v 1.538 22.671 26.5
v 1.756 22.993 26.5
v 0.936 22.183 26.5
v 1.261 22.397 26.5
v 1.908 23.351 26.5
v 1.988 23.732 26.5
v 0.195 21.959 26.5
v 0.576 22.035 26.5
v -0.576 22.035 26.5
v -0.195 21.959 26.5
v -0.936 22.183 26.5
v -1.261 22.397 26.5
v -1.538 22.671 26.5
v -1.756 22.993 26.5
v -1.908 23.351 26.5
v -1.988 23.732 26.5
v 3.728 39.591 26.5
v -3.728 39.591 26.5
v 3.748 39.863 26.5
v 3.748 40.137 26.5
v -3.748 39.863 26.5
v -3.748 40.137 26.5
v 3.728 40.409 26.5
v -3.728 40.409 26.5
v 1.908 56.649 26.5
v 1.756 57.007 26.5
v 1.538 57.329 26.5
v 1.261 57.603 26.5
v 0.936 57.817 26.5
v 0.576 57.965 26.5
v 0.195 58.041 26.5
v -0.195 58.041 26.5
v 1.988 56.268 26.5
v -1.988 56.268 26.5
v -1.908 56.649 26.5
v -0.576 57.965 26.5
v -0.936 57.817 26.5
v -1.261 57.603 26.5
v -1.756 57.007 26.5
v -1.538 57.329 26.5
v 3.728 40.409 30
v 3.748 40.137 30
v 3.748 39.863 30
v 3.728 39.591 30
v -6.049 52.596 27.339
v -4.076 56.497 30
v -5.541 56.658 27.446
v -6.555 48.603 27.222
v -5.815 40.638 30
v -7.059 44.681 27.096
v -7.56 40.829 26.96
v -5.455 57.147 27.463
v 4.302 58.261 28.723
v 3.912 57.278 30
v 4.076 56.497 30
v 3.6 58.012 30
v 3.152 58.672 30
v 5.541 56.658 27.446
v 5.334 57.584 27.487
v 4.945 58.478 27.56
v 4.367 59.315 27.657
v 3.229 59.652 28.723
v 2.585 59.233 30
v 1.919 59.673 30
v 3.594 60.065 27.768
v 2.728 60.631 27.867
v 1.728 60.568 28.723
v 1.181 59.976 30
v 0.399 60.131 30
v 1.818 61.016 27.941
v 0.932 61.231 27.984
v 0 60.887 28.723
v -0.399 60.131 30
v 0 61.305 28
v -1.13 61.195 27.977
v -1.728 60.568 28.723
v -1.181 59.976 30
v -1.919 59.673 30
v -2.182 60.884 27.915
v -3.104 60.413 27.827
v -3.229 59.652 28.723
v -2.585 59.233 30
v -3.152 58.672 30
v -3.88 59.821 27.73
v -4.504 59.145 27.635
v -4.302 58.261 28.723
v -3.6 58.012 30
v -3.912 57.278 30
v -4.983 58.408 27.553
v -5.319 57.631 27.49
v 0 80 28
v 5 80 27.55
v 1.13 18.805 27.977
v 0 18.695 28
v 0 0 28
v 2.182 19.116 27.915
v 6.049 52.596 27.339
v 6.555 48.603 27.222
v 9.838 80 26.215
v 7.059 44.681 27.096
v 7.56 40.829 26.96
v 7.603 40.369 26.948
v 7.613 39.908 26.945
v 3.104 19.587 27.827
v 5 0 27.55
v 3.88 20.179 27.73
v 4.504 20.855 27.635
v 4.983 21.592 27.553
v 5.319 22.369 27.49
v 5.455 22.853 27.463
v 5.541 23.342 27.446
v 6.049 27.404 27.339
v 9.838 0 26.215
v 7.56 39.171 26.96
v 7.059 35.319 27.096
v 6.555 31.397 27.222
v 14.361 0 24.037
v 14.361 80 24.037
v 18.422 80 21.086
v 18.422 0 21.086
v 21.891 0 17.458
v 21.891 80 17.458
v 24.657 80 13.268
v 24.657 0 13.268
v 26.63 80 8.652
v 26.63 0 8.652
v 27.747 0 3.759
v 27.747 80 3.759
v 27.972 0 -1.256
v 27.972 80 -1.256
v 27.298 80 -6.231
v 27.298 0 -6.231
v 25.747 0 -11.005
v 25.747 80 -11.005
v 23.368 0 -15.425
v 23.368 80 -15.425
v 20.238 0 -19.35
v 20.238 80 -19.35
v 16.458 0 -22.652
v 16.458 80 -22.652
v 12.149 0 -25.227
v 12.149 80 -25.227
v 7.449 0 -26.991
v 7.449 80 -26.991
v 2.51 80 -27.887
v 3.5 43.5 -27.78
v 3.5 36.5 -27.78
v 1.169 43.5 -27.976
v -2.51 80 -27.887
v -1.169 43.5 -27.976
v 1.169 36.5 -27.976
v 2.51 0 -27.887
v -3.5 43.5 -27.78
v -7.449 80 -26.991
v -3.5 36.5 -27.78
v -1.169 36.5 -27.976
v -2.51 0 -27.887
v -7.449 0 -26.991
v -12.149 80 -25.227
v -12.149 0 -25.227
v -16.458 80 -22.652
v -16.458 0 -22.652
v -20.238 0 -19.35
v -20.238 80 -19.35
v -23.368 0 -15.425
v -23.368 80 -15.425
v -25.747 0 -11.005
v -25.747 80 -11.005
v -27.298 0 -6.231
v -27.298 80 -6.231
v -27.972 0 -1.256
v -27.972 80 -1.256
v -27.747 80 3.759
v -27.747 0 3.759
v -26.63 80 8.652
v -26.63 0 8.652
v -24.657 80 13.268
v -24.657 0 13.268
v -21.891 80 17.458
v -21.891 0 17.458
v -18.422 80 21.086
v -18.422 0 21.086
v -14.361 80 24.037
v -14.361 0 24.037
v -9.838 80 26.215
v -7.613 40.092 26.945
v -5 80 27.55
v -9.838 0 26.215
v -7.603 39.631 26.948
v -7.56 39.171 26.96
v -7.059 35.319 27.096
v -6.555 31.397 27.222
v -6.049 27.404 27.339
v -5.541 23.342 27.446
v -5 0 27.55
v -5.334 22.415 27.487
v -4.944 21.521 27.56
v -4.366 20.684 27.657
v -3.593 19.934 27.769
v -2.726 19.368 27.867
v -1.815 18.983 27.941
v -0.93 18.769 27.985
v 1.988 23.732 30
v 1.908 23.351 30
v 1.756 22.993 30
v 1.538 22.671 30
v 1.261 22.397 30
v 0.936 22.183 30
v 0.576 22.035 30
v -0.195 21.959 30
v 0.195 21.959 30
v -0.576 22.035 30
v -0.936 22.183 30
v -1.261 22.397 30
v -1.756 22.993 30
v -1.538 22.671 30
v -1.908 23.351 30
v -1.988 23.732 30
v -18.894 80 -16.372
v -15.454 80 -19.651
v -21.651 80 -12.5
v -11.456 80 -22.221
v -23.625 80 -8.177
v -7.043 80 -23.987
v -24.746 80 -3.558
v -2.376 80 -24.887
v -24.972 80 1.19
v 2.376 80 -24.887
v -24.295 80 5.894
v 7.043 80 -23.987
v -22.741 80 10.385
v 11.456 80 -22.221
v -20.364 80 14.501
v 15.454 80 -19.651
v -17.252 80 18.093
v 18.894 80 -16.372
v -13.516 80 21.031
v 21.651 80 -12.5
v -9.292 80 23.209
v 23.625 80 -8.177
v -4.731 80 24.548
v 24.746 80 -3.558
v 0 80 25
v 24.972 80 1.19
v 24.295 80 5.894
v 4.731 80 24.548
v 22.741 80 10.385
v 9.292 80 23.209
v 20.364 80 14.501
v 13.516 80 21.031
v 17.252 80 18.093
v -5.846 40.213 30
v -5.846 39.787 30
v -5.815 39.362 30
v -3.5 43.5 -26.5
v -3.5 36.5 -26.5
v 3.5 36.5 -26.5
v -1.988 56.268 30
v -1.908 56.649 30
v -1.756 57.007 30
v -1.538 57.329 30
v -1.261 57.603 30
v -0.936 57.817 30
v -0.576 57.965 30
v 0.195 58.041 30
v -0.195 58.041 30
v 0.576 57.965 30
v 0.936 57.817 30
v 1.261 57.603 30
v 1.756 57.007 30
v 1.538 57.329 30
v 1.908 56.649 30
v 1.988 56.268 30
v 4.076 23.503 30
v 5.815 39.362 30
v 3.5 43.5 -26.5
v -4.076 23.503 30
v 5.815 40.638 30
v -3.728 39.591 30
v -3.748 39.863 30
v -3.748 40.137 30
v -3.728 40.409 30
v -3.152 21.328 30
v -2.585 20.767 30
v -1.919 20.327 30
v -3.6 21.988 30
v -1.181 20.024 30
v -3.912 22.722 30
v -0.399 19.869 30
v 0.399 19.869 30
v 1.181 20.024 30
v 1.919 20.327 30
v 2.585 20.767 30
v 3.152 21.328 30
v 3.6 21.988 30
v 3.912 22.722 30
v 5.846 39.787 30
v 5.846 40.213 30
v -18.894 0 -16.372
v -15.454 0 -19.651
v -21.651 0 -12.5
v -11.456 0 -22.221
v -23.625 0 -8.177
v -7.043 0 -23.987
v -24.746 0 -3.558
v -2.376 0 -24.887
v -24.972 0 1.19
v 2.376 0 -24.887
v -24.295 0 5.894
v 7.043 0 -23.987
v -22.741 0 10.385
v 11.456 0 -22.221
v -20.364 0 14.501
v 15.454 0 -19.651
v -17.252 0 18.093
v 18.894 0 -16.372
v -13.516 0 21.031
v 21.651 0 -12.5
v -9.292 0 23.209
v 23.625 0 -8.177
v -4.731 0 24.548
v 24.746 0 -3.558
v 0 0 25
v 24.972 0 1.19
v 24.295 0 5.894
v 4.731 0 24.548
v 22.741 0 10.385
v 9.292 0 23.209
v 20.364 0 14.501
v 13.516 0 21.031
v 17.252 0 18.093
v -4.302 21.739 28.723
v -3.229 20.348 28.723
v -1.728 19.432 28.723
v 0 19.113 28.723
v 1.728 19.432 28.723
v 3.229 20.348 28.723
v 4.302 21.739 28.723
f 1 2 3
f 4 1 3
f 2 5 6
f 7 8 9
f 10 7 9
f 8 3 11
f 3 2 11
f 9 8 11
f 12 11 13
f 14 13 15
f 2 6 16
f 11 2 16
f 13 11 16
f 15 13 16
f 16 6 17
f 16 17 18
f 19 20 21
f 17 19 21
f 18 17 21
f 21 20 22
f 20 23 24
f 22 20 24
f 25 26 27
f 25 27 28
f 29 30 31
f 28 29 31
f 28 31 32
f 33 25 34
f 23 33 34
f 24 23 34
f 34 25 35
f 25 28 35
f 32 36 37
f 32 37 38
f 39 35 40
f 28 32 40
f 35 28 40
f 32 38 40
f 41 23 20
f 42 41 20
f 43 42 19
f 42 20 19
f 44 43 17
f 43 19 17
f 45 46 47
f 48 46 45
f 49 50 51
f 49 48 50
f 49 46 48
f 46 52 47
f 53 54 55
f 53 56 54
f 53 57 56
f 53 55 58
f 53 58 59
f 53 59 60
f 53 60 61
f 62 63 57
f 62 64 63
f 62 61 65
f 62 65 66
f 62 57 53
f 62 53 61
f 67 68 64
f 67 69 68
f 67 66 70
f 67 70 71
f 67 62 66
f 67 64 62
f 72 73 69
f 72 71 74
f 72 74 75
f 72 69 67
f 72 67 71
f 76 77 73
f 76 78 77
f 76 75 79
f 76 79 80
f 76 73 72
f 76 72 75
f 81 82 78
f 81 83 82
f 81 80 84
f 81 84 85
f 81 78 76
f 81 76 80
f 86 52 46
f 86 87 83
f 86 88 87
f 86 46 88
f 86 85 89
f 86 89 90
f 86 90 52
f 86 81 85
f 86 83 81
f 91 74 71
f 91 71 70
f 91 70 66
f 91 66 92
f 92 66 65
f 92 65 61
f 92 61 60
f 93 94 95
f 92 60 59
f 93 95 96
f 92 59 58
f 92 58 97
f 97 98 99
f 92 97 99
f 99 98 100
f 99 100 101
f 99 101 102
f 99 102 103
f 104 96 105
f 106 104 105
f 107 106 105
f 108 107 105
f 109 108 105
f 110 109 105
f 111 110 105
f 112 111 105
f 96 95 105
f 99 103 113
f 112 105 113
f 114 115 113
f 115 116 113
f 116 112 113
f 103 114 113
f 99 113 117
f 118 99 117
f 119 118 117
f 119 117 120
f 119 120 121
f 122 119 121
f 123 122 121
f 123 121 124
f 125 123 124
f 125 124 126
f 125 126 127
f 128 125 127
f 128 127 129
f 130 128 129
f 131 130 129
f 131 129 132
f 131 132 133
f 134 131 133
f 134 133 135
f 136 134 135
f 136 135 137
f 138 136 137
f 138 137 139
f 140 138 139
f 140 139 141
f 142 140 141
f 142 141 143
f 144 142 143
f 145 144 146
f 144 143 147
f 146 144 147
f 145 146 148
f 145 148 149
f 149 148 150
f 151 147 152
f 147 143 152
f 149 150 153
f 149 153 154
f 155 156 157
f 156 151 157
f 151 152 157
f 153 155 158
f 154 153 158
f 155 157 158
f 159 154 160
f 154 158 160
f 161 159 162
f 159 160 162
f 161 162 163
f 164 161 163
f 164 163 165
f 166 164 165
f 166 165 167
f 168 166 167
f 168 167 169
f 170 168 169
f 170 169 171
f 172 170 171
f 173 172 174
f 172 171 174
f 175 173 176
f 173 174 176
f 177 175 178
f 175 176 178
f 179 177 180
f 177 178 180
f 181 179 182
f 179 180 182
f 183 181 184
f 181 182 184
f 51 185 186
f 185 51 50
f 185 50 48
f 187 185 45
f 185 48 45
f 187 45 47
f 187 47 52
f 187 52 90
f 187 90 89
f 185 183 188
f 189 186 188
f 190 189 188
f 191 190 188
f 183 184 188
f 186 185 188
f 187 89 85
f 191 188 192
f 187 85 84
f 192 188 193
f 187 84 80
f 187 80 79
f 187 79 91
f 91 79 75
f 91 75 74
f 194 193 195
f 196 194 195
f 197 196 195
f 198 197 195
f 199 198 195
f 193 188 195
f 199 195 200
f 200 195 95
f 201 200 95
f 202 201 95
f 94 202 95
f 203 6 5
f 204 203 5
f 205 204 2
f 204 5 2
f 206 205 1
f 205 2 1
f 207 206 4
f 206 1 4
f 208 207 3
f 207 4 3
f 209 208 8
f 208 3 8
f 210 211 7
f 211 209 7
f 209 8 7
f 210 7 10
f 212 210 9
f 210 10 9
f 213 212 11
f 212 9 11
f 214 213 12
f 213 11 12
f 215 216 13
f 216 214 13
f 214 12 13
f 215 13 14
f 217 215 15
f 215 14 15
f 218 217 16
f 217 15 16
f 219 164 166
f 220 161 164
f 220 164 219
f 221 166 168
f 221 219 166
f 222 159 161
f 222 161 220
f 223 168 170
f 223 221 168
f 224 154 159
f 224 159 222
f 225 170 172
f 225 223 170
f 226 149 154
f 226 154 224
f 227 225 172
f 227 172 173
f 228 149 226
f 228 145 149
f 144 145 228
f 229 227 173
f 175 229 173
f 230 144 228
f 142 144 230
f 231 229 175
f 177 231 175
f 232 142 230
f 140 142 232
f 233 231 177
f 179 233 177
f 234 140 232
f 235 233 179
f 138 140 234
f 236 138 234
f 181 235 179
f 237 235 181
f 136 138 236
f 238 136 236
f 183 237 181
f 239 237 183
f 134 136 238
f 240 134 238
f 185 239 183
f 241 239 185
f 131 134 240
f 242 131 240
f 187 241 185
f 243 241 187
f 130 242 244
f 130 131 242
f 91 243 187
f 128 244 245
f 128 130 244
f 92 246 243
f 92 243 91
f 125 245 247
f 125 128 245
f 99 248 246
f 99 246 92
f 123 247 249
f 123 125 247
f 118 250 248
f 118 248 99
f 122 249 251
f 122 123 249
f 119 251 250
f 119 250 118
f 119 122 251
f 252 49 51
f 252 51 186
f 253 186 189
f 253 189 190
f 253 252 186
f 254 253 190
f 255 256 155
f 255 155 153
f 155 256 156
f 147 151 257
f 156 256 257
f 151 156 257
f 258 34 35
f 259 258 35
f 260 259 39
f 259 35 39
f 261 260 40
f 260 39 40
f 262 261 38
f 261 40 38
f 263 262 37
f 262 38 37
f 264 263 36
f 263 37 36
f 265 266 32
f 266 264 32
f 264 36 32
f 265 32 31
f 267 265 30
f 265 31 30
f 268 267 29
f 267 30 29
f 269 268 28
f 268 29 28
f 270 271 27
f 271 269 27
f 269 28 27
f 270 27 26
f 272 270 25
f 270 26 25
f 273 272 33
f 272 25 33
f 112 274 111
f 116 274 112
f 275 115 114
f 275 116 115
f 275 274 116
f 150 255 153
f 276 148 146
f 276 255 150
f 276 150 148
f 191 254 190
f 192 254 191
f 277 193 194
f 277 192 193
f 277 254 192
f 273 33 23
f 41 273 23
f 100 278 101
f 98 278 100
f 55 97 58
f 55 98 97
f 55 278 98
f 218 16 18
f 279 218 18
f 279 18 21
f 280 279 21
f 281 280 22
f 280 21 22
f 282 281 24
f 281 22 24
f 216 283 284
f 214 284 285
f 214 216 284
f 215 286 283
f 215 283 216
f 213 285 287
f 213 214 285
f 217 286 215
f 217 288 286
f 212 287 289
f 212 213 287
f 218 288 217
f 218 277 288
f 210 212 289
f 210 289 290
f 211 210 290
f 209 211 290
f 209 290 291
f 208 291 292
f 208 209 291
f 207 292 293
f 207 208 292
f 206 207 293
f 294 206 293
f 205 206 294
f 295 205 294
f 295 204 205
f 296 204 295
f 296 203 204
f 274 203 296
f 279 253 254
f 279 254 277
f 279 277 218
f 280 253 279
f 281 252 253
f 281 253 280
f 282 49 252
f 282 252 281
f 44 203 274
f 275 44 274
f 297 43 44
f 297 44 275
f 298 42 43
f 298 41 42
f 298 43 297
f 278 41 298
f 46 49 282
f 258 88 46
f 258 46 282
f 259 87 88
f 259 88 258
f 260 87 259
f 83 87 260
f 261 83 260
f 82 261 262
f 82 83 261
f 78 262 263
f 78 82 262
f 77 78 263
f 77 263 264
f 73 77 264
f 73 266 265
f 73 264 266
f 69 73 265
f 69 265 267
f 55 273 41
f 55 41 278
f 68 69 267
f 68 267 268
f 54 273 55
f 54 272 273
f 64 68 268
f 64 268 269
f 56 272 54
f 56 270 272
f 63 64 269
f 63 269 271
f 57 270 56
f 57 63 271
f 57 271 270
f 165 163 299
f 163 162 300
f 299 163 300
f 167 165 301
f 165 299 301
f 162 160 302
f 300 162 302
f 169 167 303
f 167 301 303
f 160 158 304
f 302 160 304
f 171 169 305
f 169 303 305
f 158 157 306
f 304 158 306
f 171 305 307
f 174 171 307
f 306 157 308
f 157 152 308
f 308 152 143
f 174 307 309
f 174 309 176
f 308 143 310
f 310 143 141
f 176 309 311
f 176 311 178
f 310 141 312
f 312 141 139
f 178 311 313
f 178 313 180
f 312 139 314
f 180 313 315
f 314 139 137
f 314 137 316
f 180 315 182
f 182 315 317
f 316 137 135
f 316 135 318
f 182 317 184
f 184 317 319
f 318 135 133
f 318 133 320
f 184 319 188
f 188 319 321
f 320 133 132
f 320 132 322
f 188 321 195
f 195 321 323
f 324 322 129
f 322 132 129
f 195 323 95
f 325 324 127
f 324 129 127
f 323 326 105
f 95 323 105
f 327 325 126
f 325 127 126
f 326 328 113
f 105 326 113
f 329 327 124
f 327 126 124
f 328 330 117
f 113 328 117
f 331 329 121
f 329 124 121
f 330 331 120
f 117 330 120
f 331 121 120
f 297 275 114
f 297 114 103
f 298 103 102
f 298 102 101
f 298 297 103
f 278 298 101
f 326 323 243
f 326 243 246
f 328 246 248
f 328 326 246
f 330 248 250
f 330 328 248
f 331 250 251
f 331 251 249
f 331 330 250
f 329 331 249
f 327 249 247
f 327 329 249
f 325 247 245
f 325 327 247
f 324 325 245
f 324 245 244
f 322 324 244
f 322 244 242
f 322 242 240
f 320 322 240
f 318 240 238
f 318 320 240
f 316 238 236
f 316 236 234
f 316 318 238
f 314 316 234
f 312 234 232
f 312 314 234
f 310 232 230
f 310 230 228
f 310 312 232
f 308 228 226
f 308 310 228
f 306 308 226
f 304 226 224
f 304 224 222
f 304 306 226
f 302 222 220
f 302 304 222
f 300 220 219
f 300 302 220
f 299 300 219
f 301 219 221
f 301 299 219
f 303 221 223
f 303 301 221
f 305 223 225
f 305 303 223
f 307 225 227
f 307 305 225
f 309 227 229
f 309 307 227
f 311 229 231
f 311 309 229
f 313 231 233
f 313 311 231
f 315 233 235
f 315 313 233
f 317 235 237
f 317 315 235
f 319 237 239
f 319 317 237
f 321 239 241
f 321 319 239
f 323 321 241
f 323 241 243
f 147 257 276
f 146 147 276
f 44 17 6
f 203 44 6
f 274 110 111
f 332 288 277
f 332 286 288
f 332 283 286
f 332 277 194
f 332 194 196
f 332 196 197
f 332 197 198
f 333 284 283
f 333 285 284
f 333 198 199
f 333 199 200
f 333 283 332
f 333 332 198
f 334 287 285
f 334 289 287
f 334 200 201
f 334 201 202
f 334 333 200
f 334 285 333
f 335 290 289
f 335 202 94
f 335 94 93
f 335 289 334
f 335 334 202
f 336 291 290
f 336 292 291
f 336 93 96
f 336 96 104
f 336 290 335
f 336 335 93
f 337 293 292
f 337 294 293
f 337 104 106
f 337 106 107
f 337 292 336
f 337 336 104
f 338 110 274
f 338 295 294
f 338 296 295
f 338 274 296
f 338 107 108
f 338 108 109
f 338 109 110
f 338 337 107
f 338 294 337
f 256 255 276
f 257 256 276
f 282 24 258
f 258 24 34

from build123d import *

# Parameters (mm, degrees)
SKETCH1_R                = 28
SKETCH1_R_2              = 25
BOSS_EXTRUDE1_DEPTH      = 80
CUT_EXTRUDE3_DEPTH       = 101.768298586
EXTRUDE_THIN2_DEPTH      = 3.5
EXTRUDE_THIN3_REACH      = 104.703
EXTRUDE_THIN3_END_RADIUS = 28
EXTRUDE_THIN3_DRAFT      = 30
SKETCH10_W               = 7
SKETCH10_H               = 7
CUT_EXTRUDE4_DEPTH       = 3


with BuildPart() as part:
    # Sketch1 → Boss-Extrude1 (new body)
    with BuildSketch(Plane(origin=(0, 0, 0), x_dir=(1, 0, 0), z_dir=(0, 1, 0))):
        with Locations(Location((0, 0, 0), (0, 0, 270))):
            Circle(SKETCH1_R)
        with Locations(Location((0, 0, 0), (0, 0, 270))):
            Circle(SKETCH1_R_2, mode=Mode.SUBTRACT)
    extrude(amount=BOSS_EXTRUDE1_DEPTH)

    # Sketch6 → Cut-Extrude3 (cut, through all)
    with BuildSketch(Plane.XY.offset(26.5)):
        with BuildLine():
            Line((-3.727642468, 40.408878505), (-1.988075983, 56.268068536))
            ThreePointArc((-1.988075983, 56.268068536), (0, 58.05), (1.988075983, 56.268068536))
            Line((1.988075983, 56.268068536), (3.727642468, 40.408878505))
            ThreePointArc((3.727642468, 40.408878505), (3.75, 40), (3.727642468, 39.591121495))
            Line((3.727642468, 39.591121495), (1.988075983, 23.731931464))
            ThreePointArc((1.988075983, 23.731931464), (0, 21.95), (-1.988075983, 23.731931464))
            Line((-1.988075983, 23.731931464), (-3.727642468, 39.591121495))
            ThreePointArc((-3.727642468, 39.591121495), (-3.75, 40), (-3.727642468, 40.408878505))
        make_face()
    extrude(amount=CUT_EXTRUDE3_DEPTH, mode=Mode.SUBTRACT)

    # Sketch7 → Extrude-Thin2 (add)
    with BuildSketch(Plane.XY.offset(26.5)):
        with BuildLine():
            Line((5.715718451, 40.62694704), (3.976151966, 56.486137072))
            ThreePointArc((3.976151966, 56.486137072), (0, 60.05), (-3.976151966, 56.486137072))
            Line((-3.976151966, 56.486137072), (-5.715718451, 40.62694704))
            ThreePointArc((-5.715718451, 40.62694704), (-5.75, 40), (-5.715718451, 39.37305296))
            Line((-5.715718451, 39.37305296), (-3.976151966, 23.513862928))
            ThreePointArc((-3.976151966, 23.513862928), (0, 19.95), (3.976151966, 23.513862928))
            Line((3.976151966, 23.513862928), (5.715718451, 39.37305296))
            ThreePointArc((5.715718451, 39.37305296), (5.75, 40), (5.715718451, 40.62694704))
        make_face()
        with BuildLine():
            Line((3.727642468, 40.408878505), (1.988075983, 56.268068536))
            ThreePointArc((1.988075983, 56.268068536), (0, 58.05), (-1.988075983, 56.268068536))
            Line((-1.988075983, 56.268068536), (-3.727642468, 40.408878505))
            ThreePointArc((-3.727642468, 40.408878505), (-3.75, 40), (-3.727642468, 39.591121495))
            Line((-3.727642468, 39.591121495), (-1.988075983, 23.731931464))
            ThreePointArc((-1.988075983, 23.731931464), (0, 21.95), (1.988075983, 23.731931464))
            Line((1.988075983, 23.731931464), (3.727642468, 39.591121495))
            ThreePointArc((3.727642468, 39.591121495), (3.75, 40), (3.727642468, 40.408878505))
        make_face(mode=Mode.SUBTRACT)
    extrude(amount=EXTRUDE_THIN2_DEPTH)

    # Extrude-Thin3: up to this cylinder (the profile starts outside it)
    extrude_thin3_end = Plane(origin=(0, 48.56287, 0), z_dir=(0, -1, 0)) * Cylinder(EXTRUDE_THIN3_END_RADIUS, 266.406, mode=Mode.PRIVATE)



with BuildPart() as extrude_thin3_long_prism_1:
    # Sketch9 → Extrude-Thin3 (the long prism of profile 1, to be tilted and cut off)
    with BuildSketch(Plane.XY.offset(30)):
        with BuildLine():
            Line((-4.075555765, 56.497040498), (-5.81512225, 40.637850467))
            ThreePointArc((-5.81512225, 40.637850467), (-5.85, 40), (-5.81512225, 39.362149533))
            Line((-5.81512225, 39.362149533), (-4.075555765, 23.502959502))
            ThreePointArc((-4.075555765, 23.502959502), (0, 19.85), (4.075555765, 23.502959502))
            Line((4.075555765, 23.502959502), (5.81512225, 39.362149533))
            ThreePointArc((5.81512225, 39.362149533), (5.85, 40), (5.81512225, 40.637850467))
            Line((5.81512225, 40.637850467), (4.075555765, 56.497040498))
            ThreePointArc((4.075555765, 56.497040498), (0, 60.15), (-4.075555765, 56.497040498))
        make_face()
        with BuildLine():
            Line((-3.976151966, 56.486137072), (-5.715718451, 40.62694704))
            ThreePointArc((-5.715718451, 40.62694704), (-5.75, 40), (-5.715718451, 39.37305296))
            Line((-5.715718451, 39.37305296), (-3.976151966, 23.513862928))
            ThreePointArc((-3.976151966, 23.513862928), (0, 19.95), (3.976151966, 23.513862928))
            Line((3.976151966, 23.513862928), (5.715718451, 39.37305296))
            ThreePointArc((5.715718451, 39.37305296), (5.75, 40), (5.715718451, 40.62694704))
            Line((5.715718451, 40.62694704), (3.976151966, 56.486137072))
            ThreePointArc((3.976151966, 56.486137072), (0, 60.05), (-3.976151966, 56.486137072))
        make_face(mode=Mode.SUBTRACT)
    extrude(amount=-EXTRUDE_THIN3_REACH)
    extrude_thin3_tool1_sides = [extrude_thin3_long_prism_1.faces().sort_by_distance(p)[0] for p in [
        (4.945339007, 48.567445483, -22.3515),
        (0, 60.15, -22.3515),
        (-4.945339007, 48.567445483, -22.3515),
        (-5.85, 40, -22.3515),
        (-4.945339007, 31.432554517, -22.3515),
        (0, 19.85, -22.3515),
        (4.945339007, 31.432554517, -22.3515),
        (5.85, 40, -22.3515),
        (4.845935208, 48.556542056, -22.3515),
        (5.75, 40, -22.3515),
        (4.845935208, 31.443457944, -22.3515),
        (0, 19.95, -22.3515),
        (-4.845935208, 31.443457944, -22.3515),
        (-5.75, 40, -22.3515),
        (-4.845935208, 48.556542056, -22.3515),
        (0, 60.05, -22.3515),
    ]]
    draft(extrude_thin3_tool1_sides, Plane.XY.offset(30), EXTRUDE_THIN3_DRAFT)  # the draft: side faces tilted about the start plane


with BuildPart() as part_1:
    add(part.part)
    extrude_thin3_tool1 = extrude_thin3_long_prism_1.part - extrude_thin3_end
    add(extrude_thin3_tool1.solids().sort_by_distance((4.903625, 48.56287, 30))[0])

    # Sketch10 → Cut-Extrude4 (cut)
    with BuildSketch(Plane.XY.offset(-26.5)):
        with Locations((0, 40)):
            Rectangle(SKETCH10_W, SKETCH10_H)
    extrude(amount=-CUT_EXTRUDE4_DEPTH, mode=Mode.SUBTRACT)


solid = part_1.part
